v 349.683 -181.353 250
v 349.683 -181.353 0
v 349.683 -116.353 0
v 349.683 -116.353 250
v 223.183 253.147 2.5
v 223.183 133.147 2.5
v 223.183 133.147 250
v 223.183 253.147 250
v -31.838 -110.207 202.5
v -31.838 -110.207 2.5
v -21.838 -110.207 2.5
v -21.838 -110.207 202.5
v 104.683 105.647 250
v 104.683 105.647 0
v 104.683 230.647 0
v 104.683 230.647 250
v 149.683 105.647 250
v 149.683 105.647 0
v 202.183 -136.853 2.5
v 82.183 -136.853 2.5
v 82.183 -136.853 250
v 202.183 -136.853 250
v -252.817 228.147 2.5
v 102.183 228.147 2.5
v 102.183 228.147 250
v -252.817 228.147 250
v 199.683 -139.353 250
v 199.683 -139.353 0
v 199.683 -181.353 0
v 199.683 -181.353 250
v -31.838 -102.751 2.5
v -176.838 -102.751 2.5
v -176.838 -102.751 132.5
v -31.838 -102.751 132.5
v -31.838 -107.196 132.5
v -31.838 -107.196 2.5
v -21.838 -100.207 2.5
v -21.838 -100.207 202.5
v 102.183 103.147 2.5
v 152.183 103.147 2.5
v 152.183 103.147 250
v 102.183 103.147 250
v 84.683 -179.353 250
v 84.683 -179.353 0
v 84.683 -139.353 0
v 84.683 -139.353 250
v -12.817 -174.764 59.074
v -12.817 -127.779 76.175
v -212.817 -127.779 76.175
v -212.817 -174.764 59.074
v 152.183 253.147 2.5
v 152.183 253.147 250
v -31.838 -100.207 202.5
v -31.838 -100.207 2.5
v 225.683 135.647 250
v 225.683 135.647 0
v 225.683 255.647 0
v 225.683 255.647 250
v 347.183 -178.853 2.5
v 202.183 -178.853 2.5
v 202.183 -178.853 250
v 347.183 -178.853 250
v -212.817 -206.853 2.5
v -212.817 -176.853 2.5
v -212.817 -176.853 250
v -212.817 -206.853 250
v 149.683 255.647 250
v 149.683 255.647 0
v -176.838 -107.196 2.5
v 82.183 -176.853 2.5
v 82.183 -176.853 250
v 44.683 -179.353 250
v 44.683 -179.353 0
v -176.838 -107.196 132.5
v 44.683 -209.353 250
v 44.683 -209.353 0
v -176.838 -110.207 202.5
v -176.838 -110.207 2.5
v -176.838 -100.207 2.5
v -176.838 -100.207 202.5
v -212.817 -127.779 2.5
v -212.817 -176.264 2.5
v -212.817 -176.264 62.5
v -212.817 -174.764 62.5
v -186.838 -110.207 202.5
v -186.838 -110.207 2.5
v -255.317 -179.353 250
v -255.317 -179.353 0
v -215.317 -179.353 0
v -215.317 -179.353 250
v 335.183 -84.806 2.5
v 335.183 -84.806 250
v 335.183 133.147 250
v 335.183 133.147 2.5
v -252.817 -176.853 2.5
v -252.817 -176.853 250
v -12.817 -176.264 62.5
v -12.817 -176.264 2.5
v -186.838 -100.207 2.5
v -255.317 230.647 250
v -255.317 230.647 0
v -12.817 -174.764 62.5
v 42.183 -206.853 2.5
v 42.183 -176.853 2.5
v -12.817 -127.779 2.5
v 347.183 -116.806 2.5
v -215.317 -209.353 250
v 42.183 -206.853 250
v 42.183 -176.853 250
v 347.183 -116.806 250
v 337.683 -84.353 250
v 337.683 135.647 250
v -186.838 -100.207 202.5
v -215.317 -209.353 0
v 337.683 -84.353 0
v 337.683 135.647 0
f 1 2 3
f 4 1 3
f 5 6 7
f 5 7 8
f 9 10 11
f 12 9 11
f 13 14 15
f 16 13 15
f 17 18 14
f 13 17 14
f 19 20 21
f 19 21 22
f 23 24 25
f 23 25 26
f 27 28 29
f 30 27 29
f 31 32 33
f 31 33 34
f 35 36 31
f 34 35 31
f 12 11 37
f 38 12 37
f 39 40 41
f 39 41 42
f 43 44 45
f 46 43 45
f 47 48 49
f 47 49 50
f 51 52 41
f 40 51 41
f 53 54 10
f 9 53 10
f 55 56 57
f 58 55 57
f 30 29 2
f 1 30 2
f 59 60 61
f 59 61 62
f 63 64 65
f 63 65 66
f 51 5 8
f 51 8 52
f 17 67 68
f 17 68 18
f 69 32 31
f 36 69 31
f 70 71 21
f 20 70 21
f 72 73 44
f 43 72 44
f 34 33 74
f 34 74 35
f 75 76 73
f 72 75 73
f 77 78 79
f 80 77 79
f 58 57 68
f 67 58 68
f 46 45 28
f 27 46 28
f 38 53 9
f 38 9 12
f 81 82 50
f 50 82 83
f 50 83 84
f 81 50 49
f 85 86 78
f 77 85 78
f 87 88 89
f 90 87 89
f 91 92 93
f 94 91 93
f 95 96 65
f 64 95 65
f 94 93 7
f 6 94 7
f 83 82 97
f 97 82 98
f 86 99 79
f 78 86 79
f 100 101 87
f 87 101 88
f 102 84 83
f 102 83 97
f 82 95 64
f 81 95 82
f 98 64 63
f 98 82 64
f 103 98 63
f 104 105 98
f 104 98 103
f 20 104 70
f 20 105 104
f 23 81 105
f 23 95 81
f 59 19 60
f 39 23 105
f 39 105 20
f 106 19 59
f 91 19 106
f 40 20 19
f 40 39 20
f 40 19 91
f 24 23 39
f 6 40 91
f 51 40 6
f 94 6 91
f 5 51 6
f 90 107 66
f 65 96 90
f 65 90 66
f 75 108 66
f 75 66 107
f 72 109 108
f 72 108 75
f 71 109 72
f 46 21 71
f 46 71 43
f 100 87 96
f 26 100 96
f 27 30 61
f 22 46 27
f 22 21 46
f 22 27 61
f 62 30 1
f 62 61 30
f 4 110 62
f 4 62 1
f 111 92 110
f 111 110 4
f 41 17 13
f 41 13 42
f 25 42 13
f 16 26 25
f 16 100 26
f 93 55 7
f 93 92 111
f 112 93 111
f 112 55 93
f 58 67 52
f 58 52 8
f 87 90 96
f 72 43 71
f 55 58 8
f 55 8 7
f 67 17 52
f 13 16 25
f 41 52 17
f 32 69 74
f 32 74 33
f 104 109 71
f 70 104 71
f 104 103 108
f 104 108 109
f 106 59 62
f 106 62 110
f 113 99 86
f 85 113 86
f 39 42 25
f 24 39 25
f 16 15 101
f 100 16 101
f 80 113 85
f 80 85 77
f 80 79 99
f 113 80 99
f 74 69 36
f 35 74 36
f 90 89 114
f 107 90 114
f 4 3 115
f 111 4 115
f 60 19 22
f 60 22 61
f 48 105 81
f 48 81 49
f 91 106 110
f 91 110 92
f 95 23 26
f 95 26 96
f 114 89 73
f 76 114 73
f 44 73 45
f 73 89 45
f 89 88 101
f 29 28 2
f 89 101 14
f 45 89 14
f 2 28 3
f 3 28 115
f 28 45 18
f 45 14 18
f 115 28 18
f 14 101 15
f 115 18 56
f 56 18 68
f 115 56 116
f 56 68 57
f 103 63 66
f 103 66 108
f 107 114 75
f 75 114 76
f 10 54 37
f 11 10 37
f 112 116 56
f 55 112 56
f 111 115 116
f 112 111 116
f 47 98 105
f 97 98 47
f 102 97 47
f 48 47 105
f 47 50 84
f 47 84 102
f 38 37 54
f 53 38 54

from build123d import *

# Parameters (mm, degrees)
F1_DEPTH = 250
F2_T     = -2.5
F3_W     = 200
F3_H     = 1.5
F4_DEPTH = 60
F6_DEPTH = 200
F8_DEPTH = 200
F7_W     = 145
F7_H     = 4.445284605
F9_DEPTH = 130


with BuildPart() as f1:
    # F0 (on Top) → F1 (new body)
    with BuildSketch(Plane.XY):
        Polygon((104.6832542723, 230.6472660226), (-255.3167457277, 230.6472660226), (-255.3167457277, -179.3527339774), (-215.3167457277, -179.3527339774), (-215.3167457277, -209.3527339774), (44.6832542723, -209.3527339774), (44.6832542723, -179.3527339774), (84.6832542723, -179.3527339774), (84.6832542723, -139.3527339774), (199.6832542723, -139.3527339774), (199.6832542723, -181.3527339774), (349.6832542723, -181.3527339774), (349.6832542723, -116.3527339774), (337.6832542723, -84.3527339774), (337.6832542723, 135.6472660226), (225.6832542723, 135.6472660226), (225.6832542723, 255.6472660226), (149.6832542723, 255.6472660226), (149.6832542723, 105.6472660226), (104.6832542723, 105.6472660226), align=None)
    extrude(amount=F1_DEPTH)

    # F2
    f2_openings = [f1.faces().sort_by_distance(p)[0] for p in [
        (24.63536, 12.151901, 250),
    ]]
    offset(amount=F2_T, openings=f2_openings, kind=Kind.INTERSECTION)

    # F3 (on face) → F4 (join)
    with BuildSketch(Plane.XY.offset(2.5)):
        with Locations((-112.8167457277, -175.5136670351)):
            Rectangle(F3_W, F3_H)
    extrude(amount=F4_DEPTH)

    # F5 (on face) → F6 (join)
    with BuildSketch(Plane.YZ.offset(-12.8167457277)):
        Polygon((-127.7790359959, 76.1753777748), (-174.7636670351, 59.0743706086), (-174.7636670351, 2.5), (-127.7790359959, 2.5), align=None)
    extrude(amount=-F6_DEPTH)


with BuildPart() as f8:
    # F7 (on face) → F8 (new body)
    with BuildSketch(Plane.XY.offset(2.5)):
        Polygon((-176.8384825487, -100.2069843521), (-186.8384825487, -100.2069843521), (-186.8384825487, -110.2069843521), (-176.8384825487, -110.2069843521), (-176.8384825487, -107.1964427829), (-176.8384825487, -102.7511581779), align=None)
    extrude(amount=F8_DEPTH)


with BuildPart() as f8b:
    # F7 (on face) → F8, piece 2 (new body)
    with BuildSketch(Plane.XY.offset(2.5)):
        Polygon((-31.8384825487, -100.2069843521), (-31.8384825487, -102.7511581779), (-31.8384825487, -107.1964427829), (-31.8384825487, -110.2069843521), (-21.8384855244, -110.2069843521), (-21.8384855244, -100.2069843521), align=None)
    extrude(amount=F8_DEPTH)


with BuildPart() as f9:
    # F7 (on face) → F9 (new body)
    with BuildSketch(Plane.XY.offset(2.5)):
        with Locations((-104.3384825487, -104.9738004804)):
            Rectangle(F7_W, F7_H)
    extrude(amount=F9_DEPTH)


solid = Compound([f1.part, f8.part, f8b.part, f9.part])
